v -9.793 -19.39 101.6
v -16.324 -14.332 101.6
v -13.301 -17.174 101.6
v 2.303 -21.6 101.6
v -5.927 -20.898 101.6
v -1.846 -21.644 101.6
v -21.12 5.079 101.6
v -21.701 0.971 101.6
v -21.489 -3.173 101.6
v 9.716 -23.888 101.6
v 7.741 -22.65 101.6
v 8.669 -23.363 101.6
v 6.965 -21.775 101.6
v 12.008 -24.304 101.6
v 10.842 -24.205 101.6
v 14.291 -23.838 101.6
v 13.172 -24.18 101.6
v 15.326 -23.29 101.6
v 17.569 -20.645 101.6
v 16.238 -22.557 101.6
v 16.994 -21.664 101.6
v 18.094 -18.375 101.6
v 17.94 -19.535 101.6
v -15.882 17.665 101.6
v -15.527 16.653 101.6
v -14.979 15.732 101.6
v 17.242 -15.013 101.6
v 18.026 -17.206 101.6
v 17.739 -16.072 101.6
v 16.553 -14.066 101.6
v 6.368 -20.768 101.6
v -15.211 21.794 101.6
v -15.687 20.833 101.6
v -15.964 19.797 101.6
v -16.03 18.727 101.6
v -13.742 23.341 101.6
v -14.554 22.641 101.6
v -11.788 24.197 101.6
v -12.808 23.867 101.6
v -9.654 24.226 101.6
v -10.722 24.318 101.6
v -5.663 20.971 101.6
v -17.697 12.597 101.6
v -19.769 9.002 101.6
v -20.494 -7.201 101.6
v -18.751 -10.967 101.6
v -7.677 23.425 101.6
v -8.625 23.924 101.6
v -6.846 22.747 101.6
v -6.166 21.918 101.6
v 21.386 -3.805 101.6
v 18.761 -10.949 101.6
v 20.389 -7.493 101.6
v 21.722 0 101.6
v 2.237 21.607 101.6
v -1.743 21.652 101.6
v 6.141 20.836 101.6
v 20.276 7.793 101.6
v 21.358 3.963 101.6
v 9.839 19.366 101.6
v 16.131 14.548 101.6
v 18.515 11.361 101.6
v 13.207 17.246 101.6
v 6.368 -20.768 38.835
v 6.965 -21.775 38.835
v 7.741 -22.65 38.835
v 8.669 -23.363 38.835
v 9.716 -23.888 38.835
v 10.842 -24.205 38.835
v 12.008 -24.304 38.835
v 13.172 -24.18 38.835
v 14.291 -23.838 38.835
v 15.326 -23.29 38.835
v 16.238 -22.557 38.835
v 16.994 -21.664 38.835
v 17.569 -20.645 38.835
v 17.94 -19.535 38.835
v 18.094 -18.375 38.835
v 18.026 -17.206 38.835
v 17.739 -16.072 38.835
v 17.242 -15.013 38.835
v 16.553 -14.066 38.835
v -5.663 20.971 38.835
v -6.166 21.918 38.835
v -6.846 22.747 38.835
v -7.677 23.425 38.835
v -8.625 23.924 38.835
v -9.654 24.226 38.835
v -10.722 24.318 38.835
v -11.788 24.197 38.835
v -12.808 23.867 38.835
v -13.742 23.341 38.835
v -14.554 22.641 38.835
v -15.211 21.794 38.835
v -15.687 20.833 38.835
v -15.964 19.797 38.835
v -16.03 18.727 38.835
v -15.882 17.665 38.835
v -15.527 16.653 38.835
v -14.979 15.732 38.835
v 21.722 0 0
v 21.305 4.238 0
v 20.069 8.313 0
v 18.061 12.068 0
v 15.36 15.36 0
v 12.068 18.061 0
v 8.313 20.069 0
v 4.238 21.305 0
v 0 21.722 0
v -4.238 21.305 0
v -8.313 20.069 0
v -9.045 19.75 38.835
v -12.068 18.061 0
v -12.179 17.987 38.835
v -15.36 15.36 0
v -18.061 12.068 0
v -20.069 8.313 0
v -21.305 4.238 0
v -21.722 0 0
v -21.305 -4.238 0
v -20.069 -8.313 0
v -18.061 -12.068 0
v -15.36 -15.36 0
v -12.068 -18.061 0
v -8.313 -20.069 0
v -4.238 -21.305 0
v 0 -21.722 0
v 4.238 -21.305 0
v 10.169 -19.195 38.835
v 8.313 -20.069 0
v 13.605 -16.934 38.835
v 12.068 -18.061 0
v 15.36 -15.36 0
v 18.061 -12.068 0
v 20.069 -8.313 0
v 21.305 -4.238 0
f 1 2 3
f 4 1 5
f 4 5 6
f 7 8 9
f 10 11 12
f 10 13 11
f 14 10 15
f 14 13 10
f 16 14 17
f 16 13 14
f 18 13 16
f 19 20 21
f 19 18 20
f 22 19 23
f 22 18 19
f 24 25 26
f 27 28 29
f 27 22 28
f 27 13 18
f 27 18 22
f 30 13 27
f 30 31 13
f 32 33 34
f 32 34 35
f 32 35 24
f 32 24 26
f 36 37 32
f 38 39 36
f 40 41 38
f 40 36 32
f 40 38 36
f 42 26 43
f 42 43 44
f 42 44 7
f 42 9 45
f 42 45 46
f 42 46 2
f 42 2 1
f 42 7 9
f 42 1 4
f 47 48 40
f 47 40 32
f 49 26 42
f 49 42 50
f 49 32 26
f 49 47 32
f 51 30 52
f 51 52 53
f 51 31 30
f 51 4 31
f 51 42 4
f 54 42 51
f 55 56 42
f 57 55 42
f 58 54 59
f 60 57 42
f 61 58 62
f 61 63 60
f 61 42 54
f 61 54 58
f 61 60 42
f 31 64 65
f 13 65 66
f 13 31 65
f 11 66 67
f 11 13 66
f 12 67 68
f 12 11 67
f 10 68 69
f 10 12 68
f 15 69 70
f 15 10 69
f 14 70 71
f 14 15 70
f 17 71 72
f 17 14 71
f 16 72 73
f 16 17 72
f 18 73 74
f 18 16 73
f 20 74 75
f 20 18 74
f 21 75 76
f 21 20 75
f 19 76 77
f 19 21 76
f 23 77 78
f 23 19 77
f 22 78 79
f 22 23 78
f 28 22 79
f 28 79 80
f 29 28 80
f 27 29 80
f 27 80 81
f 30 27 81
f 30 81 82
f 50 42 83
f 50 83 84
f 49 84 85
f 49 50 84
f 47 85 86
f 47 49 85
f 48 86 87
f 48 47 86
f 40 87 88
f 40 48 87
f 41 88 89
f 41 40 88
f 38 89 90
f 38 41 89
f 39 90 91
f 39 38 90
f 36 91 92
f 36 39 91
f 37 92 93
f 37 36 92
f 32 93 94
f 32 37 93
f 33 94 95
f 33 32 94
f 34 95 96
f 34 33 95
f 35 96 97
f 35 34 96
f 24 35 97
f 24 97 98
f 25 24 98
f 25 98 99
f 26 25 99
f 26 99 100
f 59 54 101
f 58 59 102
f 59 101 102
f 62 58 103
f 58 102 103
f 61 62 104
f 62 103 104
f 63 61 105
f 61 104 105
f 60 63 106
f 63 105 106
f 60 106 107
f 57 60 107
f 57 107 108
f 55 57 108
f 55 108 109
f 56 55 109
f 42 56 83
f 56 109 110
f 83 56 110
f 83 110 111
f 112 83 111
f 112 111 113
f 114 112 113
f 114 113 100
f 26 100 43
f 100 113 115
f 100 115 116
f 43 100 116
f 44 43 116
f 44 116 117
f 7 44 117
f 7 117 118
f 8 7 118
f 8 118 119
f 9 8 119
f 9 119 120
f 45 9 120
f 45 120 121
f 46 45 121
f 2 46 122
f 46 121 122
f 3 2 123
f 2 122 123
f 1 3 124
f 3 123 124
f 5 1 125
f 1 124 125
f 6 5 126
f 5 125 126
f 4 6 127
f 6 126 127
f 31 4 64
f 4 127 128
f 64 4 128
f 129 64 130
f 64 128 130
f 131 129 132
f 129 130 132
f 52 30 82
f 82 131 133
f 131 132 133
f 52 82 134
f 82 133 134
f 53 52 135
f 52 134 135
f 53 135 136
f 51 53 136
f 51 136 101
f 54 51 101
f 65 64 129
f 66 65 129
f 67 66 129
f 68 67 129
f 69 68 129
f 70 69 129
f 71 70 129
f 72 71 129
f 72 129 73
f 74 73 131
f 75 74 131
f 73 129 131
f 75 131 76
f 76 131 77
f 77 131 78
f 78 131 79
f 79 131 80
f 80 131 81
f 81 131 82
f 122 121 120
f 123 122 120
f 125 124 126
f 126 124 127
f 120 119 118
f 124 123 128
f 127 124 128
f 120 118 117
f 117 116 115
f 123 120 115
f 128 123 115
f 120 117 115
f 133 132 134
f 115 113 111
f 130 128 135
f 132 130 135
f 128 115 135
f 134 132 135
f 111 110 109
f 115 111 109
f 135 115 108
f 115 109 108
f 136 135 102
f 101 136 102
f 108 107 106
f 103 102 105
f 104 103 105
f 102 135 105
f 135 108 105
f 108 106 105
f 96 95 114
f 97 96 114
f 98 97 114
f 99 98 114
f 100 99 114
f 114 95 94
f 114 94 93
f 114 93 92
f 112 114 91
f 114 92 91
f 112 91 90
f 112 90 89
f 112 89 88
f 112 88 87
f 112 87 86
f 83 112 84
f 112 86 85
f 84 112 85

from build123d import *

# Parameters (mm, degrees)
F1_R     = 21.7223344902
F2_DEPTH = 101.6
F4_DEPTH = 99.02421
F3_R     = 6.1579906
F3_R_2   = 5.385299851
F5_DEPTH = 62.76523


# Not quite as in the source:
# - a feature names something its author has since deleted; it is built from what else it names


with BuildPart() as f2:
    # F1 (on Top) → F2 (new body)
    with BuildSketch(Plane.XY):
        Circle(F1_R)
    extrude(amount=F2_DEPTH)

    # F3 (on face) → F4 (join)
    with BuildSketch(Plane.XY.offset(101.6)):
        with BuildLine():
            ThreePointArc((6.3684736853, -20.7678202666), (11.9405298036, -18.1461721505), (16.5529894413, -14.0662132879))
            ThreePointArc((16.5529894413, -14.0662132879), (8.5555496891, -13.0019756287), (6.3684736853, -20.7678202666))
        make_face()
    extrude(amount=-F4_DEPTH)

    # F3 (on face) → F5 (join)
    with BuildSketch(Plane.XY.offset(101.6)):
        with Locations((11.9405298036, -18.1461721505)):
            Circle(F3_R)
        with Locations((-10.6482523042, 18.933423847)):
            Circle(F3_R_2)
    extrude(amount=-F5_DEPTH)


solid = f2.part
